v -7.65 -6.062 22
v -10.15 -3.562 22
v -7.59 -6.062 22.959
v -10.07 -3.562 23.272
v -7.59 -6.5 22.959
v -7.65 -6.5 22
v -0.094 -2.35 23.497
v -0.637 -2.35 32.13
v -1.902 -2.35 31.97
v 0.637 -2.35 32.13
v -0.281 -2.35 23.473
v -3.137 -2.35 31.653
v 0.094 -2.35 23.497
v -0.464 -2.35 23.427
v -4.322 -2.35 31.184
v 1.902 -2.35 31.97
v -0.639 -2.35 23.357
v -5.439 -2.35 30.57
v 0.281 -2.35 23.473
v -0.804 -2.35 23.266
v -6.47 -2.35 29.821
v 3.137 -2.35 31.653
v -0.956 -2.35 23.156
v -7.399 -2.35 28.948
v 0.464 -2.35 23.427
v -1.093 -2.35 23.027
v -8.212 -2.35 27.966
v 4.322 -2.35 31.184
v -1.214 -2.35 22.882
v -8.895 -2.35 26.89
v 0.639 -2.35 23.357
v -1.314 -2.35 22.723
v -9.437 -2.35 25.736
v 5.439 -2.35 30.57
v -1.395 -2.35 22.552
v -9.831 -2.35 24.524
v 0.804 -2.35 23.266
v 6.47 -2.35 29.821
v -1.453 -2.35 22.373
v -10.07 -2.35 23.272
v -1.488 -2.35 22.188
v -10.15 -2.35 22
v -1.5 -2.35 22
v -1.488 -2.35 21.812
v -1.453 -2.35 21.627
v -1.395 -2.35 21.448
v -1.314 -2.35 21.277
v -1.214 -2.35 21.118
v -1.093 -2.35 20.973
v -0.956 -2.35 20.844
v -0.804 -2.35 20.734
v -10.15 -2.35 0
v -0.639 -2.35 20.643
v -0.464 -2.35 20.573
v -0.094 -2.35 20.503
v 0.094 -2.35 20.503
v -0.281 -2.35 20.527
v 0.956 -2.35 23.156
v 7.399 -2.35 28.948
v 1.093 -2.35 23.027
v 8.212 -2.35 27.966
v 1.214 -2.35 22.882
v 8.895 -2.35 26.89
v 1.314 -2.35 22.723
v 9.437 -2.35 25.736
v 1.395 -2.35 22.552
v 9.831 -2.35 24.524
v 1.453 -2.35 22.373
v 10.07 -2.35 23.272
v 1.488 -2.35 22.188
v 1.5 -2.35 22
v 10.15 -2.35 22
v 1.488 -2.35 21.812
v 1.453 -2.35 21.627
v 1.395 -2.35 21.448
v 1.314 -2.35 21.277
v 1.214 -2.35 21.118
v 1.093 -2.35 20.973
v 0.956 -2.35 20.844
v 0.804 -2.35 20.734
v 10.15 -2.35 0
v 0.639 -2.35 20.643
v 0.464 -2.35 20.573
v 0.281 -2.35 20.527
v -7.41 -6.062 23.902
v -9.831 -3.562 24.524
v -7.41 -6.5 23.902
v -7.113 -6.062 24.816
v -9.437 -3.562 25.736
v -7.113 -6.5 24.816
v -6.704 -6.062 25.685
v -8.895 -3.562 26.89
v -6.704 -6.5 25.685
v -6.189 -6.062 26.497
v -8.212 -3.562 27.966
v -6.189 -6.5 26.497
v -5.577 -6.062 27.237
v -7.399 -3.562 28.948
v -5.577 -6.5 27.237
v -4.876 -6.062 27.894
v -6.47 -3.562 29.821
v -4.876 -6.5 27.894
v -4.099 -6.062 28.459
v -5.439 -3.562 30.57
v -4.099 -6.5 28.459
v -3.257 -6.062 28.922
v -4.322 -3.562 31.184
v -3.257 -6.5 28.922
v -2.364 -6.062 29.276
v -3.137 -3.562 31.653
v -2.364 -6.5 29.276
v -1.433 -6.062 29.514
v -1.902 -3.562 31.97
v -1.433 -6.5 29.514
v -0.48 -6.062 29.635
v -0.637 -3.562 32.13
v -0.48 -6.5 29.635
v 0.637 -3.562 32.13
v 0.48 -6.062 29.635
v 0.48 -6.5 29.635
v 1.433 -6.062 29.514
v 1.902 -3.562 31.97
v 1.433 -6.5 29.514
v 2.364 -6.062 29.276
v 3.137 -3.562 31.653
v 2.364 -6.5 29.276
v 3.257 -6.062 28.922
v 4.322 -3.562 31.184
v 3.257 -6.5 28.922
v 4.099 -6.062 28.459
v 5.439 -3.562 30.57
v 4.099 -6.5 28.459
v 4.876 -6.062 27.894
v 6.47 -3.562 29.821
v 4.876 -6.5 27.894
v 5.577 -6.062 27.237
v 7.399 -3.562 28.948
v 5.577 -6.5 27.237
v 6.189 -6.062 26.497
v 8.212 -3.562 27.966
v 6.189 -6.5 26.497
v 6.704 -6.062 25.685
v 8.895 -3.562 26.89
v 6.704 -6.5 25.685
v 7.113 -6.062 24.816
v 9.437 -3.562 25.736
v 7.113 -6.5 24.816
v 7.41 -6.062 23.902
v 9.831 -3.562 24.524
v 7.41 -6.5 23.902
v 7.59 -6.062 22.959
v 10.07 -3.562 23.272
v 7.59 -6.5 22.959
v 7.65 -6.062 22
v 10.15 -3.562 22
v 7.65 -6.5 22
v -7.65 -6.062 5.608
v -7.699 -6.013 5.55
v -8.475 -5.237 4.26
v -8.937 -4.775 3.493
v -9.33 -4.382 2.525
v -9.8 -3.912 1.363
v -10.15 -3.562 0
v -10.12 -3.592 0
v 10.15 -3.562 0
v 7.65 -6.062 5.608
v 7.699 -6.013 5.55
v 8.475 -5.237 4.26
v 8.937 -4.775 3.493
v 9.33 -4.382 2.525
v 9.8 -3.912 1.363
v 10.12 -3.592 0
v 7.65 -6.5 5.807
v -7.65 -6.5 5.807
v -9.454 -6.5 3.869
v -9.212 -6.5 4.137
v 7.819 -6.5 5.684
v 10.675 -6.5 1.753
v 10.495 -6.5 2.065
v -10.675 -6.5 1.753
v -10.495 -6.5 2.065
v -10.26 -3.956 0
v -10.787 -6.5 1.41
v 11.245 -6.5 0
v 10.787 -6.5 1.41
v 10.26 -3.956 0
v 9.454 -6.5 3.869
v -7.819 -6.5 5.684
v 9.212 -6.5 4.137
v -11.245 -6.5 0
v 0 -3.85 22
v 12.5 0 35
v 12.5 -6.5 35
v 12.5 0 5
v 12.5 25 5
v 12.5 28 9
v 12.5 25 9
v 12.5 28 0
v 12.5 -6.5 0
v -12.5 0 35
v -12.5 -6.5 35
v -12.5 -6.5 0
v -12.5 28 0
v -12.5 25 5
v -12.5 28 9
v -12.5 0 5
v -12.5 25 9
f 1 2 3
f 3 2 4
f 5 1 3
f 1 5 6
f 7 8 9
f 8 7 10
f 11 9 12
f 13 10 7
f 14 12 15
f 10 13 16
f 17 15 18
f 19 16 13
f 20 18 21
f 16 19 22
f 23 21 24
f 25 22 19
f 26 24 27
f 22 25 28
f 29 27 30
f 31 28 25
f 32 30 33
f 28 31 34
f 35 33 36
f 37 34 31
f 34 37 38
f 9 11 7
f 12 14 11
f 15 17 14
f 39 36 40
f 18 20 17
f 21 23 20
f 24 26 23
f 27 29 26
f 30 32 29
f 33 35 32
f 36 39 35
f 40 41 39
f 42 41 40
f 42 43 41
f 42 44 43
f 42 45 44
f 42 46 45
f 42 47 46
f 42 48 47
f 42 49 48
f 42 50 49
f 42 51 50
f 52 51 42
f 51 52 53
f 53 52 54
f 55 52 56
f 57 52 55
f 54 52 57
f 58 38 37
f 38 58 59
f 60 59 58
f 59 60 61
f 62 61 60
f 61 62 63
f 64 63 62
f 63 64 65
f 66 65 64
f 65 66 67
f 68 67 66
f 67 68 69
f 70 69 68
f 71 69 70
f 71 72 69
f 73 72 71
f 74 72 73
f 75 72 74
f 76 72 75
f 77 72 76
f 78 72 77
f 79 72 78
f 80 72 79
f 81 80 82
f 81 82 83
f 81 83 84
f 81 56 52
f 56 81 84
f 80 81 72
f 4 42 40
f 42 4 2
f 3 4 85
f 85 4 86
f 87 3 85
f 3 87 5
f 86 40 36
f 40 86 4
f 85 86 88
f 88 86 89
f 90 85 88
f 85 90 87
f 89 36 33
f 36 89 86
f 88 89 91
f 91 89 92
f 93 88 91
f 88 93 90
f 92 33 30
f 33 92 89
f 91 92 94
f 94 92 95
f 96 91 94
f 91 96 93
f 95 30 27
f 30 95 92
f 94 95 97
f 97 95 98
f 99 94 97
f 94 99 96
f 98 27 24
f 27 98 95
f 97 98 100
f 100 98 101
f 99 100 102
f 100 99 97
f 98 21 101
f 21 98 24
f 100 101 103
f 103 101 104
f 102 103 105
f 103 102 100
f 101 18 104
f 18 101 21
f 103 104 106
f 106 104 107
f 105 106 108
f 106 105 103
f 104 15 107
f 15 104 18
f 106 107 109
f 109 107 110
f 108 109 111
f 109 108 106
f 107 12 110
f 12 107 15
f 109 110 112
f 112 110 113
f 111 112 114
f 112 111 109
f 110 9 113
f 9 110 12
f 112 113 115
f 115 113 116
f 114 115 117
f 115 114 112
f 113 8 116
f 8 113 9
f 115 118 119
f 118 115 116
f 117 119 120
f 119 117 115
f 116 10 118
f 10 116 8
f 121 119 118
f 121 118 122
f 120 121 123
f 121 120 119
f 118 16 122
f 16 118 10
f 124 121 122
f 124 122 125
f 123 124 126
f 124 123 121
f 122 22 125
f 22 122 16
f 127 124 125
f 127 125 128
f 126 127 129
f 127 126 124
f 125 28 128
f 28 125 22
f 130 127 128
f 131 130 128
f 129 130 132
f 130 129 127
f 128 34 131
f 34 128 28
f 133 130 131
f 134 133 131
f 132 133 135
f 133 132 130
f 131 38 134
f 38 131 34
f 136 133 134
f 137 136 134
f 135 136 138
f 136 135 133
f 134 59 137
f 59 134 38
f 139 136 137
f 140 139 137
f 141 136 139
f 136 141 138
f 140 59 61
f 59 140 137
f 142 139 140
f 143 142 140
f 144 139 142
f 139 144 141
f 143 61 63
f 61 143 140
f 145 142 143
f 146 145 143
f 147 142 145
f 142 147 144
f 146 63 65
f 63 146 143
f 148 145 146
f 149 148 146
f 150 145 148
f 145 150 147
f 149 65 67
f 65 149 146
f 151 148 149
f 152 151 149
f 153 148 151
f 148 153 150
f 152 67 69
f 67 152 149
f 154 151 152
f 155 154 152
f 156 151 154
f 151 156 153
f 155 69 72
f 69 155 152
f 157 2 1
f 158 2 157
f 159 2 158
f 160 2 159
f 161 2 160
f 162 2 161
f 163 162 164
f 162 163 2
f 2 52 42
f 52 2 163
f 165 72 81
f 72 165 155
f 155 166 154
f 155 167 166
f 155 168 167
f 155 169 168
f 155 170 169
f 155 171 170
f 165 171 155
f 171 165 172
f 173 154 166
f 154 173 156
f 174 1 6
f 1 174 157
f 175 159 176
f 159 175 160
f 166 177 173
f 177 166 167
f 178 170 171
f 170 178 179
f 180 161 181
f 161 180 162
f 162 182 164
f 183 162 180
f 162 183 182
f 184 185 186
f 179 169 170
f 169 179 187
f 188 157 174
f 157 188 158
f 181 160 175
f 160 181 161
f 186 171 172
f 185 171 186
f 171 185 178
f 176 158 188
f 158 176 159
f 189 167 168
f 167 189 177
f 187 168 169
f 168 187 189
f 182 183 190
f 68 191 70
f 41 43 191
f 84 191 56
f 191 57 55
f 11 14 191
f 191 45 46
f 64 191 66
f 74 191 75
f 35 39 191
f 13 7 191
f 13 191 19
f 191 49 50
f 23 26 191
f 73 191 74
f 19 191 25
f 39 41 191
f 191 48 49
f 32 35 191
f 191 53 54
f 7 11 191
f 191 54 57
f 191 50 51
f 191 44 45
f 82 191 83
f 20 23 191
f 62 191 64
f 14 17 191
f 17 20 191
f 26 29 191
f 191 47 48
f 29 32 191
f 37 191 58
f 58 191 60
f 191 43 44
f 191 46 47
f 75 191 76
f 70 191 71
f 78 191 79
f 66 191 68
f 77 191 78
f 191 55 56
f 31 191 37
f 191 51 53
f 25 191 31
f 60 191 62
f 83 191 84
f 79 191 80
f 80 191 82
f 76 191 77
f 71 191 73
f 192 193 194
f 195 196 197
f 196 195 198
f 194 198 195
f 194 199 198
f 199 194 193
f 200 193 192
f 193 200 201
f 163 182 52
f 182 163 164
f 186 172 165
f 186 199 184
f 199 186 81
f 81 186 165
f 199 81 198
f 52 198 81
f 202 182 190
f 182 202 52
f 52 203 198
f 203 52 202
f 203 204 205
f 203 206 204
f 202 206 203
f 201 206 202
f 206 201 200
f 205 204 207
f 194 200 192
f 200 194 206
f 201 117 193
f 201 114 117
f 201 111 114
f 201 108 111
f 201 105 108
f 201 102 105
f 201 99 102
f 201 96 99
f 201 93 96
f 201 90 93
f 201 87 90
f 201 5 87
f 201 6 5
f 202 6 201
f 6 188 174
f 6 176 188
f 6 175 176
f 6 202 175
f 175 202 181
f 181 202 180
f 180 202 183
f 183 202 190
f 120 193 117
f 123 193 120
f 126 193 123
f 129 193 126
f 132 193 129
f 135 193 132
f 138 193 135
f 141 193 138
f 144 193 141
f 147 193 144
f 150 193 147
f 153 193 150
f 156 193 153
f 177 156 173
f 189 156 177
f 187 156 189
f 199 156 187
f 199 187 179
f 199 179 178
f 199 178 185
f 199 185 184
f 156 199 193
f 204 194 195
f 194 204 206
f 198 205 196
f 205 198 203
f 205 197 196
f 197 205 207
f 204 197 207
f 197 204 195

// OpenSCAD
/*Created by Andy Levesque
Credit to @David D on Printables and Jonathan at Keep Making for Multiconnect and Multiboard, respectively
Licensed Creative Commons 4.0 Attribution Non-Commercial Sharable with Attribution
*/

/* [Standard Parameters] */
hookWidth = 25;
hookInternalDepth = 25;
hookLipHeight = 4;

/*[Additional Customization]*/
hookLipThickness = 3;
hookBottomThickness = 5;
backHeight = 35;

/*[Slot Customization]*/
//Distance between Multiconnect slots on the back (25mm is standard for MultiBoard)
distanceBetweenSlots = 25;
//QuickRelease removes the small indent in the top of the slots that lock the part into place
slotQuickRelease = false;
//Dimple scale tweaks the size of the dimple in the slot for printers that need a larger dimple to print correctly
dimpleScale = 1; //[0.5:.05:1.5]
//Scale the size of slots in the back (1.015 scale is default for a tight fit. Increase if your finding poor fit. )
slotTolerance = 1.00; //[0.925:0.005:1.075]
//Move the slot in (positive) or out (negative)
slotDepthMicroadjustment = 0; //[-.5:0.05:.5]
//enable a slot on-ramp for easy mounting of tall items
onRampEnabled = true;
//frequency of slots for on-ramp. 1 = every slot; 2 = every 2 slots; etc.
onRampEveryXSlots = 1;


/*[Hidden]*/
backWidth = max(distanceBetweenSlots,hookWidth);

//Hook
union(){
    //back
    translate(v = [-backWidth/2,0,0]) 
        multiconnectBack(backWidth = backWidth, backHeight = backHeight, distanceBetweenSlots = distanceBetweenSlots);
    //hook base
    translate(v = [-hookWidth/2,0,0]) 
        cube(size = [hookWidth,hookInternalDepth+hookLipThickness,hookBottomThickness]);
    //hook lip
    translate(v = [-hookWidth/2,hookInternalDepth,0]) 
        cube(size = [hookWidth,hookLipThickness,hookLipHeight+hookBottomThickness]);
}

//BEGIN MODULES
//Slotted back Module
module multiconnectBack(backWidth, backHeight, distanceBetweenSlots)
{
    //slot count calculates how many slots can fit on the back. Based on internal width for buffer. 
    //slot width needs to be at least the distance between slot for at least 1 slot to generate
    let (backWidth = max(backWidth,distanceBetweenSlots), backHeight = max(backHeight, 25),slotCount = floor(backWidth/distanceBetweenSlots), backThickness = 6.5){
        difference() {
            translate(v = [0,-backThickness,0]) cube(size = [backWidth,backThickness,backHeight]);
            //Loop through slots and center on the item
            //Note: I kept doing math until it looked right. It's possible this can be simplified.
            for (slotNum = [0:1:slotCount-1]) {
                translate(v = [distanceBetweenSlots/2+(backWidth/distanceBetweenSlots-slotCount)*distanceBetweenSlots/2+slotNum*distanceBetweenSlots,-2.35+slotDepthMicroadjustment,backHeight-13]) {
                    slotTool(backHeight);
                }
            }
        }
    }
    //Create Slot Tool
    module slotTool(totalHeight) {
        scale(v = slotTolerance)
        //slot minus optional dimple with optional on-ramp
        let (slotProfile = [[0,0],[10.15,0],[10.15,1.2121],[7.65,3.712],[7.65,5],[0,5]])
        difference() {
            union() {
                //round top
                rotate(a = [90,0,0,]) 
                    rotate_extrude($fn=50) 
                        polygon(points = slotProfile);
                //long slot
                translate(v = [0,0,0]) 
                    rotate(a = [180,0,0]) 
                    linear_extrude(height = totalHeight+1) 
                        union(){
                            polygon(points = slotProfile);
                            mirror([1,0,0])
                                polygon(points = slotProfile);
                        }
                //on-ramp
                if(onRampEnabled)
                    for(y = [1:onRampEveryXSlots:totalHeight/distanceBetweenSlots])
                        translate(v = [0,-5,-y*distanceBetweenSlots]) 
                            rotate(a = [-90,0,0]) 
                                cylinder(h = 5, r1 = 12, r2 = 10.15);
            }
            //dimple
            if (slotQuickRelease == false)
                scale(v = dimpleScale) 
                rotate(a = [90,0,0,]) 
                    rotate_extrude($fn=50) 
                        polygon(points = [[0,0],[0,1.5],[1.5,0]]);
        }
    }
}
